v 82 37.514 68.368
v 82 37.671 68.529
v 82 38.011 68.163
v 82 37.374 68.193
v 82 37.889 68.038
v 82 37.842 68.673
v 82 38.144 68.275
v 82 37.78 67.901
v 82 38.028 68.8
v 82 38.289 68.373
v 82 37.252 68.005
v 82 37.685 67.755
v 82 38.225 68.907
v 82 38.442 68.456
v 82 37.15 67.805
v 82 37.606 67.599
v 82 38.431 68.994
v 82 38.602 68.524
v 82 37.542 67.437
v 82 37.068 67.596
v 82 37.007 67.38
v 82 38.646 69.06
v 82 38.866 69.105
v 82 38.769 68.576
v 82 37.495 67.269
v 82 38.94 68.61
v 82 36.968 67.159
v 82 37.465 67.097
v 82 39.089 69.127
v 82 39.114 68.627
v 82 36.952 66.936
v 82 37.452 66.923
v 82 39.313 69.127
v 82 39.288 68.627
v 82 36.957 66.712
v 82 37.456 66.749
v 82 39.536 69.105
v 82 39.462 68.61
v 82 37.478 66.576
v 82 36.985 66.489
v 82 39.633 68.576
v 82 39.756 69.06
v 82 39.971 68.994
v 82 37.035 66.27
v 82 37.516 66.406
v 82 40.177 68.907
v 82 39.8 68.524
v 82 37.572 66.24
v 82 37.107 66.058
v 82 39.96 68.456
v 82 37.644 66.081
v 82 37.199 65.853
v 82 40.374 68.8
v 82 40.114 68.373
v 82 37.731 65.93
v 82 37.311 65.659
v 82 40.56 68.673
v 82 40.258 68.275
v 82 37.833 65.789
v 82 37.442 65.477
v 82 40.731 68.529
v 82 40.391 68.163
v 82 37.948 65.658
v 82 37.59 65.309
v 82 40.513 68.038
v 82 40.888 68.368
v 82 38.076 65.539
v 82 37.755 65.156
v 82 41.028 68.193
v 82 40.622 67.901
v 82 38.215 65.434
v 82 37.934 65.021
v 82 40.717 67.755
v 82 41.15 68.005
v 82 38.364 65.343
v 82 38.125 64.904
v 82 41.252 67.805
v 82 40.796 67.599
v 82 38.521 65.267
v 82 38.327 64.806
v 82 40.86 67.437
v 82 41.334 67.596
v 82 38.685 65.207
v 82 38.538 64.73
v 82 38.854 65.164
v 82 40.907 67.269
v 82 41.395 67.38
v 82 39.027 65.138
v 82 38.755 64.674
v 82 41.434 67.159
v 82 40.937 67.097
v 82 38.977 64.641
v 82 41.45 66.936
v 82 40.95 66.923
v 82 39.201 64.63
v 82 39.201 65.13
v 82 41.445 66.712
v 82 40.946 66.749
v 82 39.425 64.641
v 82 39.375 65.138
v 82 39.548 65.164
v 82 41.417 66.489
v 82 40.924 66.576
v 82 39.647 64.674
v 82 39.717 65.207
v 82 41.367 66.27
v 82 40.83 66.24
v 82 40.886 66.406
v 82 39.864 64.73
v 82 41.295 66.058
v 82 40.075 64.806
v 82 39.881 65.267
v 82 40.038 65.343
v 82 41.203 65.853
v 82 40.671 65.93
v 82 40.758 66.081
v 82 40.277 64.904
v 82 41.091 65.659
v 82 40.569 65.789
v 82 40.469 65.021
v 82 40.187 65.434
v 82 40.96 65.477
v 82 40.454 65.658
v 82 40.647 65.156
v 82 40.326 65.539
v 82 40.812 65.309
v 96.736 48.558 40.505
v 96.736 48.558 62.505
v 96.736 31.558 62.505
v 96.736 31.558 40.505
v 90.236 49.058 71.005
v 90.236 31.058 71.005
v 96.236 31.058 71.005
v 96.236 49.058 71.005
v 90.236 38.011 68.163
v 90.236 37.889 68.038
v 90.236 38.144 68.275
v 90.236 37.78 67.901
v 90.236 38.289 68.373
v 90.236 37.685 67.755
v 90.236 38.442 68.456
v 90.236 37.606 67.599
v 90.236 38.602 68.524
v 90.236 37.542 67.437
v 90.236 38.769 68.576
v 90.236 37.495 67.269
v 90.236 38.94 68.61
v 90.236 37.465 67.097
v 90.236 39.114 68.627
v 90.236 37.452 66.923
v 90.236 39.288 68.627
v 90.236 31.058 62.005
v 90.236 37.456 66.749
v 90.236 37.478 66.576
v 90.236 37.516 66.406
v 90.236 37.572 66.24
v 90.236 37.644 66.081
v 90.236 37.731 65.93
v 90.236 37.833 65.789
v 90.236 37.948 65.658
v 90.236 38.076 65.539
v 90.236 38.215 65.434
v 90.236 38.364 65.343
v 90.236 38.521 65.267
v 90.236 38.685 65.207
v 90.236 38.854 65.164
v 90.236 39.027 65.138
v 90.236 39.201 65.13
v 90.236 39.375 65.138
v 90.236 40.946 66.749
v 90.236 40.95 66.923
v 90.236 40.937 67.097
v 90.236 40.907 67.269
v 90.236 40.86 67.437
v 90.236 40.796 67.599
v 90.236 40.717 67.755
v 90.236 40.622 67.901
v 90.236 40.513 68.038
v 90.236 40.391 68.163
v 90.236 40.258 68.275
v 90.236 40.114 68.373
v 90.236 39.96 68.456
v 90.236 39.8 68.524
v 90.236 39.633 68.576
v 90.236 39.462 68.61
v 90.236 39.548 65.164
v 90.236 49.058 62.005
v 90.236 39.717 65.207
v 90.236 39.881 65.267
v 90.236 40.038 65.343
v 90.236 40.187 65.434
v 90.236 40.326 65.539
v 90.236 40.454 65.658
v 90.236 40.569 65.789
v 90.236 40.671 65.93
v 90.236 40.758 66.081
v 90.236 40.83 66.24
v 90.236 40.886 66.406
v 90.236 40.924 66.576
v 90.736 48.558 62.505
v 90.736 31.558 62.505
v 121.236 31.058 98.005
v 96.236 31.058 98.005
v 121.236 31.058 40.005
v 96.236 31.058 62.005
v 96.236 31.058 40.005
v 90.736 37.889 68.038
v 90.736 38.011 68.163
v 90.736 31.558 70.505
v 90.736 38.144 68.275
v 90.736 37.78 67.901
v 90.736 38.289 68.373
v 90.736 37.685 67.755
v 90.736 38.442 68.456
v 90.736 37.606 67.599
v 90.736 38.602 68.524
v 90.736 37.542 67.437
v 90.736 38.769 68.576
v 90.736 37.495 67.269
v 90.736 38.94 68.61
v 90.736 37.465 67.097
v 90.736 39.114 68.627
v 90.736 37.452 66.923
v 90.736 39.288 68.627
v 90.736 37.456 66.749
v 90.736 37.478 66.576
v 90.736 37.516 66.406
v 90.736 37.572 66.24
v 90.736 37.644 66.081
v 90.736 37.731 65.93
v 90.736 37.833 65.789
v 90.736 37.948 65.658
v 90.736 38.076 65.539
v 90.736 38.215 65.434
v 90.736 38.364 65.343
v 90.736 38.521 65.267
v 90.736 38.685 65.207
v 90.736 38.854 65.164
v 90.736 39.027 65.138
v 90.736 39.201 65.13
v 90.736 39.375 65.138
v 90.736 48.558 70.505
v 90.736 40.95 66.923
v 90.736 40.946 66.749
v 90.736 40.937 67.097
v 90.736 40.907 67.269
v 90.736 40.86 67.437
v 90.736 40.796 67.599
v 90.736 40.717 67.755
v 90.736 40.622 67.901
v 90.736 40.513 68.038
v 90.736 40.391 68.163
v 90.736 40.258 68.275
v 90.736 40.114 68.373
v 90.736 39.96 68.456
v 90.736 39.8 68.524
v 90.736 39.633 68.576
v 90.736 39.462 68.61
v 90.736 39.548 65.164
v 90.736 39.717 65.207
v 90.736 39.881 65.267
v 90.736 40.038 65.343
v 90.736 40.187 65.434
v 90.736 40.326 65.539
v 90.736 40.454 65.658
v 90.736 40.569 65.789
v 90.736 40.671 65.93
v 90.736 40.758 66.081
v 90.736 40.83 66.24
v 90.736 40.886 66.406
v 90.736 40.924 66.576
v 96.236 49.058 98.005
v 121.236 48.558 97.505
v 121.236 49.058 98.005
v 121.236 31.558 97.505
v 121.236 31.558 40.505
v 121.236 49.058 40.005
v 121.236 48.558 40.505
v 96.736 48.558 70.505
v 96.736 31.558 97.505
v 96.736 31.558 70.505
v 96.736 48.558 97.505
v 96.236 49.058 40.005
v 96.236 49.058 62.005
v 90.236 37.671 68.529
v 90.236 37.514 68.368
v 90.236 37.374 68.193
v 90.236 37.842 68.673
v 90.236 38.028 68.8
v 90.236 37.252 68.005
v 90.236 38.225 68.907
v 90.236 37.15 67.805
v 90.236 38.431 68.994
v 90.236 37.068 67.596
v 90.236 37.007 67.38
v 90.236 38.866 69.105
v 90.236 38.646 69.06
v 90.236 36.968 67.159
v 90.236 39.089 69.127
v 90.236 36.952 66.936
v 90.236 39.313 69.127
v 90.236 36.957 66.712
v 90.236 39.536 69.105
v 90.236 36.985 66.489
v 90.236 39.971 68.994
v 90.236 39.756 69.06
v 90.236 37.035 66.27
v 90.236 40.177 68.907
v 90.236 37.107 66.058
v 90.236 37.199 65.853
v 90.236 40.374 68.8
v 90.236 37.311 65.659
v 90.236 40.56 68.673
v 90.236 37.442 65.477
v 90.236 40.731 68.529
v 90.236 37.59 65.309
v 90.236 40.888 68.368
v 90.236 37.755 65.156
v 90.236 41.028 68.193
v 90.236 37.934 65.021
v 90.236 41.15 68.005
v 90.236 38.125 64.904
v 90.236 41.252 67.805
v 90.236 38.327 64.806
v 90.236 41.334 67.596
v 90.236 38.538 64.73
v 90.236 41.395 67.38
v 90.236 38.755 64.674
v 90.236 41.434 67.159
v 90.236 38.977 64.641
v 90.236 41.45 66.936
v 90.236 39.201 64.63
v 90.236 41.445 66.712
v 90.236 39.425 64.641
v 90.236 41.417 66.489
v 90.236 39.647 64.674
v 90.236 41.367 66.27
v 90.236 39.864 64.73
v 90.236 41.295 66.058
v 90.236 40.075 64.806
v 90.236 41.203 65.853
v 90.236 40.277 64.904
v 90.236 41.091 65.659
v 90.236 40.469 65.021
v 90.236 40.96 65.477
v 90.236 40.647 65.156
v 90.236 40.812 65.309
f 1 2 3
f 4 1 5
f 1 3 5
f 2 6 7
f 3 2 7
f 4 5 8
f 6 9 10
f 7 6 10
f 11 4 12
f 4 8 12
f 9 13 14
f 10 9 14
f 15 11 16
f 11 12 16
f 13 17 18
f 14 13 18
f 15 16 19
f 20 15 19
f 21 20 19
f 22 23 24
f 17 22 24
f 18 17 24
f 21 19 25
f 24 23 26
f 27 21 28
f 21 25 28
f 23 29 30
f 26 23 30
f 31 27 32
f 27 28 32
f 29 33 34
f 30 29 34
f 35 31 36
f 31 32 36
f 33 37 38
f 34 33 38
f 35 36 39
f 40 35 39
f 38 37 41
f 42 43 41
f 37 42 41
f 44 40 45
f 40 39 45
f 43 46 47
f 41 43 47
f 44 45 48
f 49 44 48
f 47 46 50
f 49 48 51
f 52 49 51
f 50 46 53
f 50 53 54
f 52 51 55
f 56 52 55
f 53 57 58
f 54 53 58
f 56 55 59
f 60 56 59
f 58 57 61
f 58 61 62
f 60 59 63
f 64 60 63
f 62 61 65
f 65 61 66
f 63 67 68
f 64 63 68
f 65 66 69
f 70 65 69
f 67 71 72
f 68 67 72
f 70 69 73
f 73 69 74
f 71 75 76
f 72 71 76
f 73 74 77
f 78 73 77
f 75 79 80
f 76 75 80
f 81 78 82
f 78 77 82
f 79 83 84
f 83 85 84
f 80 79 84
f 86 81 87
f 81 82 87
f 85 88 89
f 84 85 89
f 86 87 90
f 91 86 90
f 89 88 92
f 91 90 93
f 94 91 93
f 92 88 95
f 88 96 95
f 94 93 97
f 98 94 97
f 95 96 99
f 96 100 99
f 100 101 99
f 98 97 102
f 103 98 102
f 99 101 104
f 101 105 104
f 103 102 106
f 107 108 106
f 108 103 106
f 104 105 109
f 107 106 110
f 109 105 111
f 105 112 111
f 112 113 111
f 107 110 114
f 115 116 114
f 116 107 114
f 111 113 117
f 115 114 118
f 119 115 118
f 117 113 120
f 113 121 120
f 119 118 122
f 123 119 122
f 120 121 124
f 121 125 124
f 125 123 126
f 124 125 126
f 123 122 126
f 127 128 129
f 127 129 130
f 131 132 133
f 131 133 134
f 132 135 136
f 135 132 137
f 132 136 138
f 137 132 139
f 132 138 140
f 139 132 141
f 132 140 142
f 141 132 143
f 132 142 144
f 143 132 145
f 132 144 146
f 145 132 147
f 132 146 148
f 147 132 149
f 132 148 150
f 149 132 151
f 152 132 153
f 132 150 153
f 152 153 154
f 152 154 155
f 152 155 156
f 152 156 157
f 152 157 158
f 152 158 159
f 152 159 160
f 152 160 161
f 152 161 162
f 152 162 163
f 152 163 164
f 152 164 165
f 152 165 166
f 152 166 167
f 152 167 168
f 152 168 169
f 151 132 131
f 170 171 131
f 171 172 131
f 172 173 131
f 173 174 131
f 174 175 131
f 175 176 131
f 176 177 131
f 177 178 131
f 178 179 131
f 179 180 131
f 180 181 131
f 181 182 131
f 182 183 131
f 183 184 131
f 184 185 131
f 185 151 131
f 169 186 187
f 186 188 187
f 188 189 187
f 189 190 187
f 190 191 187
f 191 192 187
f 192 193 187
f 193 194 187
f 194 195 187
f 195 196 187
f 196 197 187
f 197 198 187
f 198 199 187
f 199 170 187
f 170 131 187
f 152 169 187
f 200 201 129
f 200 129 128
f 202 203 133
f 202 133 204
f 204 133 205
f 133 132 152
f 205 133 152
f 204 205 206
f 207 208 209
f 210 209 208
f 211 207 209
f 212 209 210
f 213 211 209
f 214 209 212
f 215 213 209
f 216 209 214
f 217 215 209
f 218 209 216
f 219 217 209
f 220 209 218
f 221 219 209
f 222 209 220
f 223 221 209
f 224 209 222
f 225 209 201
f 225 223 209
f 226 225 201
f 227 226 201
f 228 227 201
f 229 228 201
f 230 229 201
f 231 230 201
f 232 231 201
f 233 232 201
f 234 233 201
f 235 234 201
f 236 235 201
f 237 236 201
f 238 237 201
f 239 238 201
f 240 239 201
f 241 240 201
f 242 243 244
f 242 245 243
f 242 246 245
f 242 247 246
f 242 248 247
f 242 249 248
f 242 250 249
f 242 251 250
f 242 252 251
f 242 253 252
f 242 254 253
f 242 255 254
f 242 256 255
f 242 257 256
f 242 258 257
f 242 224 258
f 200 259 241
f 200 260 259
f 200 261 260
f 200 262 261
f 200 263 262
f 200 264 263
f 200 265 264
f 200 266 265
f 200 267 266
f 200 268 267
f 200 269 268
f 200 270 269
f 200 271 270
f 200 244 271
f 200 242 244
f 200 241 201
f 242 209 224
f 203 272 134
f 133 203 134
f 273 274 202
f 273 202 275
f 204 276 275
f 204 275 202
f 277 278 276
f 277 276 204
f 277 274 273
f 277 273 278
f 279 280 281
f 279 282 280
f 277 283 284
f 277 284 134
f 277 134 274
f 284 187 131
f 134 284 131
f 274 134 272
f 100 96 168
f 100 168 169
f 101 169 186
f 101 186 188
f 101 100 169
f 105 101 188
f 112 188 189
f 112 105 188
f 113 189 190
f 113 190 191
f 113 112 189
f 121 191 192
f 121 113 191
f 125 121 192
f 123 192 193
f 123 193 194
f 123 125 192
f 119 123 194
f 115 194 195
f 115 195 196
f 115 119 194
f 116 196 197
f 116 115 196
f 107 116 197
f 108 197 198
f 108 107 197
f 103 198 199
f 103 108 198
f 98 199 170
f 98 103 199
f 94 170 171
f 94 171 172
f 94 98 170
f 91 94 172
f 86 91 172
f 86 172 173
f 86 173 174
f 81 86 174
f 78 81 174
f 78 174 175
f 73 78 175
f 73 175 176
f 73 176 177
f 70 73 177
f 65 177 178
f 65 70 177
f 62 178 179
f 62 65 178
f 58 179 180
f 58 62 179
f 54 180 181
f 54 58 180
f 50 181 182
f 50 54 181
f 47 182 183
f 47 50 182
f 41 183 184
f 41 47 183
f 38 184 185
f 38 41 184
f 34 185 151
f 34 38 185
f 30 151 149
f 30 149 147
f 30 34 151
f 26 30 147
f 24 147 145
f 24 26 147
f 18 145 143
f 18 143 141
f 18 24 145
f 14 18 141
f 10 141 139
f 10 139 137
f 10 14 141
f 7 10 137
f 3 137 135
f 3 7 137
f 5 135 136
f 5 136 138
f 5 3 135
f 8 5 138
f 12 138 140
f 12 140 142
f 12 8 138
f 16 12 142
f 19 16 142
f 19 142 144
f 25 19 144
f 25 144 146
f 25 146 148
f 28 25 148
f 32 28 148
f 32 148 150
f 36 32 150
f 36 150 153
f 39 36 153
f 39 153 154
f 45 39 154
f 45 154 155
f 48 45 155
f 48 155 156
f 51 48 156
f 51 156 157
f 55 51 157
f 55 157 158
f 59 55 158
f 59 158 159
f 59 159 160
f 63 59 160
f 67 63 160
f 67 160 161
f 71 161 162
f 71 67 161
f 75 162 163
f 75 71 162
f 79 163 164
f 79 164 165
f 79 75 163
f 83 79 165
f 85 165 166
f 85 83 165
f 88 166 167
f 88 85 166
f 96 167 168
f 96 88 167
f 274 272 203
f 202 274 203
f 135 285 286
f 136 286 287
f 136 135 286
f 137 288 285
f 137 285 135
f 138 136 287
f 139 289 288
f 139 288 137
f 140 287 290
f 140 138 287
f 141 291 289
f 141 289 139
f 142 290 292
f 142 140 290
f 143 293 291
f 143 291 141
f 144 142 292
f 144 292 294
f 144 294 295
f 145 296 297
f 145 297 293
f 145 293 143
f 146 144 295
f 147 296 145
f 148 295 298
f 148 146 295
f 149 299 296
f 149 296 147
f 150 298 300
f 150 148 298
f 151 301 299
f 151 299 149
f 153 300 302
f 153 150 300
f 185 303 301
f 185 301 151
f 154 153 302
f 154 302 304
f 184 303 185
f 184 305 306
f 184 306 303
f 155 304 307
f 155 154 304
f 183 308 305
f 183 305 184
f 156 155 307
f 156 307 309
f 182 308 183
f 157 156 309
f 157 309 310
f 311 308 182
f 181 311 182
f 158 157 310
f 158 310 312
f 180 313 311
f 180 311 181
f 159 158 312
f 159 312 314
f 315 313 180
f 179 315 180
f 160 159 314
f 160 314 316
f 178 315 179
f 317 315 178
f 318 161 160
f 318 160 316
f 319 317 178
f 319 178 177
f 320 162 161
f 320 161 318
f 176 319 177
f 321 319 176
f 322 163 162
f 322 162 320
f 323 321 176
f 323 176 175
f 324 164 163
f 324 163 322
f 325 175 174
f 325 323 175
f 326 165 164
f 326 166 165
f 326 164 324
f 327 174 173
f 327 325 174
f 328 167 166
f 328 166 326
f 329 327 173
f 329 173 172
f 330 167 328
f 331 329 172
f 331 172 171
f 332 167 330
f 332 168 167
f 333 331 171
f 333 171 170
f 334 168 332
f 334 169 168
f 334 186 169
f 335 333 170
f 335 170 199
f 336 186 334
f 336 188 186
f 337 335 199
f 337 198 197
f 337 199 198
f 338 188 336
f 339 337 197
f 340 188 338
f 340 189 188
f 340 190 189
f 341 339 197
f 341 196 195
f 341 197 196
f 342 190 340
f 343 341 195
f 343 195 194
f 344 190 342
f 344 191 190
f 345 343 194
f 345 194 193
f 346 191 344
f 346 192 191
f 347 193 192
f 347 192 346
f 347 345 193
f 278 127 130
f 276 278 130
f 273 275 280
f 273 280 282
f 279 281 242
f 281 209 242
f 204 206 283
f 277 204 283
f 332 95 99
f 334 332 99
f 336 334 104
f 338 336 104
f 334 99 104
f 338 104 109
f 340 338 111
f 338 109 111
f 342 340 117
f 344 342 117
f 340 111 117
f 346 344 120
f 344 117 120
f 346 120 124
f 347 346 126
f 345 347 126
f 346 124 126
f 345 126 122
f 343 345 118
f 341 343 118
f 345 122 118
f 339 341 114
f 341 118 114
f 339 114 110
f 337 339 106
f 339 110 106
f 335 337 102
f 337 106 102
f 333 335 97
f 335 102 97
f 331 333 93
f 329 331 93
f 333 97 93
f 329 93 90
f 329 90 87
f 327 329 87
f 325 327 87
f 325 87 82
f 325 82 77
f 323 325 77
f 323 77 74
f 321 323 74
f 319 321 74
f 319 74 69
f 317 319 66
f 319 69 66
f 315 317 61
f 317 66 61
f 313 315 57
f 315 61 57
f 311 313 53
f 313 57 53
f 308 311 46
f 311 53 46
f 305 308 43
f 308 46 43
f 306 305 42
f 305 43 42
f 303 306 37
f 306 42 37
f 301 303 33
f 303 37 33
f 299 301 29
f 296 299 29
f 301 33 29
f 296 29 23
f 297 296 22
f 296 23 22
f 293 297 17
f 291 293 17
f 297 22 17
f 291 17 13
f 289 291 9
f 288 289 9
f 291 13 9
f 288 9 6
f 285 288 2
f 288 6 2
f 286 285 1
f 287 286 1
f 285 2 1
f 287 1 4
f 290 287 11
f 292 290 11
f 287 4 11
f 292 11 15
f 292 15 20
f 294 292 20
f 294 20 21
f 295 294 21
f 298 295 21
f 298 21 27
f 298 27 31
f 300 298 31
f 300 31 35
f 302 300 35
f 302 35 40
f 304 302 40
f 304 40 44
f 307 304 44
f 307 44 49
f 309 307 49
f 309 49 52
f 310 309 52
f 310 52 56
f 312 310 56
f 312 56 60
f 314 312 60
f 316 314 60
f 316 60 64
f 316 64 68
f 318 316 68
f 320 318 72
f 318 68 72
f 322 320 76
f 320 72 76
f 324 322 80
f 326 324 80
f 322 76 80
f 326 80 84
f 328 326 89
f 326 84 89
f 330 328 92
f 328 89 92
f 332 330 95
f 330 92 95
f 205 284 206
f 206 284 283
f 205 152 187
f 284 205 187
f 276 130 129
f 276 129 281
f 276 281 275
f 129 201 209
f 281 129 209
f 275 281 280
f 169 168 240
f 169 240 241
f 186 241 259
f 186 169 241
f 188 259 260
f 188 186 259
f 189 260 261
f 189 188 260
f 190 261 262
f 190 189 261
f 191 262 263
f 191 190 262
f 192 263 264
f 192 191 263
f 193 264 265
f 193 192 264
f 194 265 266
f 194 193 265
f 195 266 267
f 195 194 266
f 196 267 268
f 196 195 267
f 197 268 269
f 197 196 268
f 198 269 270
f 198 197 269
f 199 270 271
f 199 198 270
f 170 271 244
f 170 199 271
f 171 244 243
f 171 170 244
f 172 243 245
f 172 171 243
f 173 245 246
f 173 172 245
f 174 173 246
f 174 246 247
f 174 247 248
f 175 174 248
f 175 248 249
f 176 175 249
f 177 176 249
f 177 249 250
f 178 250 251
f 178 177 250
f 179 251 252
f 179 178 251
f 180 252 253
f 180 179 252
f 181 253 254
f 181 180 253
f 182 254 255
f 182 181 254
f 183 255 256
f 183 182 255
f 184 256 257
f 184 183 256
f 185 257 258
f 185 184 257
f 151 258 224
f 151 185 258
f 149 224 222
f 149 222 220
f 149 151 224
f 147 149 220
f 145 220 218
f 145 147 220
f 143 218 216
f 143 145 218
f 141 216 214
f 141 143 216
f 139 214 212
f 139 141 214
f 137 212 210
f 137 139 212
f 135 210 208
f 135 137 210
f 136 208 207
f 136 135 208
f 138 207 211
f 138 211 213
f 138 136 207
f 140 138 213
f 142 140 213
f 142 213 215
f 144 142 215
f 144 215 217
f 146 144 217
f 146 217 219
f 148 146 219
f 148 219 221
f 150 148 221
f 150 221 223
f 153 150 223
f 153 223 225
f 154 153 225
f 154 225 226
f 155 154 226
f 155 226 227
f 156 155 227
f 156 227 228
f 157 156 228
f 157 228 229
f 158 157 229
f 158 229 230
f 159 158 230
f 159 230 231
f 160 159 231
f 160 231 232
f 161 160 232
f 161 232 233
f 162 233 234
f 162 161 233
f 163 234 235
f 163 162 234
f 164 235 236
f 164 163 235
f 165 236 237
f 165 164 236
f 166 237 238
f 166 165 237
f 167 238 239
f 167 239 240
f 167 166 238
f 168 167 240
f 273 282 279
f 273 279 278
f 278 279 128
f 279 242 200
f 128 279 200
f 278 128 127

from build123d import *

# Parameters (mm, degrees)
SKETCH2_R           = 2.25
SKETCH2_R_2         = 1.75
BOSS_EXTRUDE1_DEPTH = 8.235963
SKETCH3_W           = 9
SKETCH3_H           = 18
SKETCH3_W_2         = 8
SKETCH3_H_2         = 17
BOSS_EXTRUDE2_DEPTH = 6
SKETCH3_3_W         = 8
SKETCH3_3_H         = 17
SKETCH3_3_R         = 1.75
BOSS_EXTRUDE4_DEPTH = 0.5
SKETCH4_W           = 26.5
SKETCH4_H           = 17
SKETCH4_W_2         = 0.5
SKETCH4_W_3         = 21.5
BOSS_EXTRUDE5_DEPTH = 0.5
BOSS_EXTRUDE6_DEPTH = 25


with BuildPart() as part:
    # Sketch2 → Boss-Extrude1 (new body)
    with BuildSketch(Plane(origin=(82, 0, 0), x_dir=(0, 0, -1), z_dir=(1, 0, 0))):
        with Locations((-66.879673477, 39.201031326)):
            Circle(SKETCH2_R)
        with Locations((-66.879673477, 39.201031326)):
            Circle(SKETCH2_R_2, mode=Mode.SUBTRACT)
    extrude(amount=BOSS_EXTRUDE1_DEPTH)


with BuildPart() as body_2:
    # Sketch3 → Boss-Extrude2 (new body)
    with BuildSketch(Plane(origin=(90.235962573, 0, 0), x_dir=(0, 0, -1), z_dir=(1, 0, 0))):
        with Locations((-66.504673477, 40.057518668)):
            Rectangle(SKETCH3_W, SKETCH3_H)
        with Locations((-66.504673477, 40.057518668)):
            Rectangle(SKETCH3_W_2, SKETCH3_H_2, mode=Mode.SUBTRACT)
    extrude(amount=BOSS_EXTRUDE2_DEPTH)

    # Sketch3<3> → Boss-Extrude4 (add)
    with BuildSketch(Plane(origin=(90.235962573, 0, 0), x_dir=(0, 0, -1), z_dir=(1, 0, 0))):
        with Locations((-66.504673477, 40.057518668)):
            Rectangle(SKETCH3_3_W, SKETCH3_3_H)
        with Locations((-66.879673477, 39.201031326)):
            Circle(SKETCH3_3_R, mode=Mode.SUBTRACT)
    extrude(amount=BOSS_EXTRUDE4_DEPTH)

    # Sketch4 → Boss-Extrude5 (add)
    with BuildSketch(Plane(origin=(96.235962573, 0, 0), x_dir=(0, 0, -1), z_dir=(1, 0, 0))):
        Polygon((-71.004673477, 49.057518668), (-98.004673477, 49.057518668), (-98.004673477, 31.057518668), (-71.004673477, 31.057518668), (-71.004673477, 31.557518668), (-97.504673477, 31.557518668), (-97.504673477, 48.557518668), (-71.004673477, 48.557518668), align=None)
        with Locations((-84.254673477, 40.057518668)):
            Rectangle(SKETCH4_W, SKETCH4_H)
        Polygon((-62.004673477, 49.057518668), (-71.004673477, 49.057518668), (-71.004673477, 48.557518668), (-70.504673477, 48.557518668), (-62.504673477, 48.557518668), (-62.004673477, 48.557518668), align=None)
        with Locations((-70.754673477, 40.057518668)):
            Rectangle(SKETCH4_W_2, SKETCH4_H)
        Polygon((-71.004673477, 31.557518668), (-71.004673477, 31.057518668), (-62.004673477, 31.057518668), (-62.004673477, 31.557518668), (-62.504673477, 31.557518668), (-70.504673477, 31.557518668), align=None)
        with Locations((-62.254673477, 40.057518668)):
            Rectangle(SKETCH4_W_2, SKETCH4_H)
        with Locations((-51.254673477, 40.057518668)):
            Rectangle(SKETCH4_W_3, SKETCH4_H)
        Polygon((-40.004673477, 49.057518668), (-62.004673477, 49.057518668), (-62.004673477, 48.557518668), (-40.504673477, 48.557518668), (-40.504673477, 31.557518668), (-62.004673477, 31.557518668), (-62.004673477, 31.057518668), (-40.004673477, 31.057518668), align=None)
    extrude(amount=BOSS_EXTRUDE5_DEPTH)

    # Sketch4<4> → Boss-Extrude6 (add)
    with BuildSketch(Plane(origin=(96.235962573, 0, 0), x_dir=(0, 0, -1), z_dir=(1, 0, 0))):
        Polygon((-62.004673477, 49.057518668), (-71.004673477, 49.057518668), (-71.004673477, 48.557518668), (-70.504673477, 48.557518668), (-62.504673477, 48.557518668), (-62.004673477, 48.557518668), align=None)
        Polygon((-71.004673477, 49.057518668), (-98.004673477, 49.057518668), (-98.004673477, 31.057518668), (-71.004673477, 31.057518668), (-71.004673477, 31.557518668), (-97.504673477, 31.557518668), (-97.504673477, 48.557518668), (-71.004673477, 48.557518668), align=None)
        Polygon((-40.004673477, 49.057518668), (-62.004673477, 49.057518668), (-62.004673477, 48.557518668), (-40.504673477, 48.557518668), (-40.504673477, 31.557518668), (-62.004673477, 31.557518668), (-62.004673477, 31.057518668), (-40.004673477, 31.057518668), align=None)
        Polygon((-71.004673477, 31.557518668), (-71.004673477, 31.057518668), (-62.004673477, 31.057518668), (-62.004673477, 31.557518668), (-62.504673477, 31.557518668), (-70.504673477, 31.557518668), align=None)
    extrude(amount=BOSS_EXTRUDE6_DEPTH)


solid = Compound([part.part, body_2.part])
